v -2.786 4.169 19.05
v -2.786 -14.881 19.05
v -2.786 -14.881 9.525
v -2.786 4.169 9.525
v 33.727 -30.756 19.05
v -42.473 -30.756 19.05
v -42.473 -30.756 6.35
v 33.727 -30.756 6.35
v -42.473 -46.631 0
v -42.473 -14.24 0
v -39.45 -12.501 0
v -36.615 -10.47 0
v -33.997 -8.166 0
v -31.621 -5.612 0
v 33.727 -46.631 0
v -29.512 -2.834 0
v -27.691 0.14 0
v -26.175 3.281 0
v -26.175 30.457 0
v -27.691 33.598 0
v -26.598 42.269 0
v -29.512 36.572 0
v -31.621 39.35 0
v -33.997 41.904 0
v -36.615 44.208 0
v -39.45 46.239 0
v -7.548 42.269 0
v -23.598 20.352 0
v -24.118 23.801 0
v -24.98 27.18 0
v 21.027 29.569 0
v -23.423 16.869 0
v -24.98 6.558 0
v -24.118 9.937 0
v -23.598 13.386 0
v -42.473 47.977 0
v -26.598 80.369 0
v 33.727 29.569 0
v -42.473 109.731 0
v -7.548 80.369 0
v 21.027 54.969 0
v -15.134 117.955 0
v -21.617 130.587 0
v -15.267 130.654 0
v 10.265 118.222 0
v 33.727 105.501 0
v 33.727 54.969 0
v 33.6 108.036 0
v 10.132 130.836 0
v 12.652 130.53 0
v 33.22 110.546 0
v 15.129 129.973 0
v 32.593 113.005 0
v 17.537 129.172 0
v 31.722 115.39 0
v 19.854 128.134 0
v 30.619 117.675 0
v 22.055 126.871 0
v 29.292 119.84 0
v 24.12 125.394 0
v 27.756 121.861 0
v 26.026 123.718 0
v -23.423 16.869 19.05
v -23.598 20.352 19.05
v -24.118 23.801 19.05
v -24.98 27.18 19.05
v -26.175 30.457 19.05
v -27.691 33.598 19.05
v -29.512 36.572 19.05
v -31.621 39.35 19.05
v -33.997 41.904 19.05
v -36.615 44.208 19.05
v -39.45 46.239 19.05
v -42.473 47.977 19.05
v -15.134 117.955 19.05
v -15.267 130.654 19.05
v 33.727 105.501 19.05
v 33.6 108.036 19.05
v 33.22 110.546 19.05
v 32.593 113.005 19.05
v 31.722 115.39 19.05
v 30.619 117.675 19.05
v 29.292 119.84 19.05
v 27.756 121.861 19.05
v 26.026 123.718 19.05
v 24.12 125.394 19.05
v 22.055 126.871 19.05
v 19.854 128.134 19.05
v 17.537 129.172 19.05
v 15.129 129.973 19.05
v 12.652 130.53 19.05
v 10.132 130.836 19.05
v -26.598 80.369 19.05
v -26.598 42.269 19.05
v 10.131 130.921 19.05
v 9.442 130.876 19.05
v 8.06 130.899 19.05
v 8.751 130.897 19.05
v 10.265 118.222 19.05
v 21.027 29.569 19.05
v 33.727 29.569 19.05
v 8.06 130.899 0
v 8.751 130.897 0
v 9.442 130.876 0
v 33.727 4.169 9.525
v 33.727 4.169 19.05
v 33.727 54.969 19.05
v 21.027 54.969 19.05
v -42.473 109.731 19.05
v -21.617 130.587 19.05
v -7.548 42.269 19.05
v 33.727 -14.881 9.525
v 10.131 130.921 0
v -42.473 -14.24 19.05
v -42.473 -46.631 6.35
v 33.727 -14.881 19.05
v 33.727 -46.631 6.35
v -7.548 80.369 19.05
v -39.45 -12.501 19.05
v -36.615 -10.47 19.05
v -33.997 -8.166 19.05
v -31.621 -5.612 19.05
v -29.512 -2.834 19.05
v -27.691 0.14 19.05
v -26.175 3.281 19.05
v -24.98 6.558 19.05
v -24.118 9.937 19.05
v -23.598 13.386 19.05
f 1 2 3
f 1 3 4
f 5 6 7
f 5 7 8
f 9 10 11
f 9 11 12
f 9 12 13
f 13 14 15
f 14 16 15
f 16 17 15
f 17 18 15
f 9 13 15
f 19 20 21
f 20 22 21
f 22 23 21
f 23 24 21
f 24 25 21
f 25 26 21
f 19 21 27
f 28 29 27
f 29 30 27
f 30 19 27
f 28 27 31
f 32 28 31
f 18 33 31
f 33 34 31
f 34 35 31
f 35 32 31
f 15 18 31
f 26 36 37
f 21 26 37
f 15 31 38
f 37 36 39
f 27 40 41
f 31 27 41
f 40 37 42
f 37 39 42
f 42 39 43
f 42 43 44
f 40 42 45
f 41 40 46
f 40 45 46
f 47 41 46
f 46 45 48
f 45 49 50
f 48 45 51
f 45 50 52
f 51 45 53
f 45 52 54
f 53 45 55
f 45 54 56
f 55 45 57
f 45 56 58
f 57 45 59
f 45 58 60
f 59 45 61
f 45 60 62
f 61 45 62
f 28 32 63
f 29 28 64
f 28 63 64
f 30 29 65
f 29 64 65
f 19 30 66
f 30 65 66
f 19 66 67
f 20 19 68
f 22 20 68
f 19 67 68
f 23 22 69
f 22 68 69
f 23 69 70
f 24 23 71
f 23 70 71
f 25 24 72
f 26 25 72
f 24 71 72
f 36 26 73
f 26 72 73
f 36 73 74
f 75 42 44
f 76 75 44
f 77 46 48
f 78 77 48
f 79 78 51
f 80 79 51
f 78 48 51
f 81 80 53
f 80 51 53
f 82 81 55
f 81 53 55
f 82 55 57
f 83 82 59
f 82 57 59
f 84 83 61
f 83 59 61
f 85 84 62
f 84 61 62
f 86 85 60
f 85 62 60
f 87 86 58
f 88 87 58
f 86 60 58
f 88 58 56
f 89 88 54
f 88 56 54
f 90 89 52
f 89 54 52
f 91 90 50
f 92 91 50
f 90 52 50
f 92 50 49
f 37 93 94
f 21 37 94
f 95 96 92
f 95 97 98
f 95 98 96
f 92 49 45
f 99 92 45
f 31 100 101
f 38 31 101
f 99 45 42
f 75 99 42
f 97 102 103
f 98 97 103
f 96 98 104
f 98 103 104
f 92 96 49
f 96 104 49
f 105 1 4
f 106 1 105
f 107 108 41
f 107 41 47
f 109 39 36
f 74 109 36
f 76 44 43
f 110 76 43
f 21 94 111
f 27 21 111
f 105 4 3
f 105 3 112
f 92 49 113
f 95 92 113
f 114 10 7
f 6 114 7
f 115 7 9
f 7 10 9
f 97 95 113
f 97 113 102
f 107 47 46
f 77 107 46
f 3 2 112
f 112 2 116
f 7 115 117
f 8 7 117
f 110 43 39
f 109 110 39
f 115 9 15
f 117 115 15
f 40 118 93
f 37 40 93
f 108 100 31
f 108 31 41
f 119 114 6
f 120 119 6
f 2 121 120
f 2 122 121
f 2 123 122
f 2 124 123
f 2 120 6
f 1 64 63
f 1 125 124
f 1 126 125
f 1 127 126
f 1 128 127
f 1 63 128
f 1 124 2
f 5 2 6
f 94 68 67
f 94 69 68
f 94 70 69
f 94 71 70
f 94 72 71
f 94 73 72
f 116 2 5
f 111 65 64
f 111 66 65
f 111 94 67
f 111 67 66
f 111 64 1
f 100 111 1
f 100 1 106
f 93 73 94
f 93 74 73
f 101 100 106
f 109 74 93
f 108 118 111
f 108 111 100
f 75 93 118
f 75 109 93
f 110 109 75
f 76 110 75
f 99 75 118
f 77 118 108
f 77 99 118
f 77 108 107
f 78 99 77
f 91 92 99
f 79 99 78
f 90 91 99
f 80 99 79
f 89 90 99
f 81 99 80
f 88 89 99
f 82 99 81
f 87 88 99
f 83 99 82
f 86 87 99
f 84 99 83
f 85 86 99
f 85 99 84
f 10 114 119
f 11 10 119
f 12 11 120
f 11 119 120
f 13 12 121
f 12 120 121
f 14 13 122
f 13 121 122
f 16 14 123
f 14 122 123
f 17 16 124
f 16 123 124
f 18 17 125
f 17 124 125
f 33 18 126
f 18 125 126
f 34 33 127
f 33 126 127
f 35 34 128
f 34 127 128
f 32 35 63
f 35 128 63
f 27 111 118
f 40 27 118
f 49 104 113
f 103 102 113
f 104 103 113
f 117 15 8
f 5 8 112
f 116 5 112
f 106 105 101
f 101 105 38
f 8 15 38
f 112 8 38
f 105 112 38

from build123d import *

# Parameters (mm, degrees)
F1_DEPTH = 19.05
F2_W     = 76.2
F2_H     = 12.7
F3_DEPTH = 15.875
F5_DEPTH = 25.4
F6_W     = 36.5125
F6_H     = 19.05
F7_DEPTH = 9.525
F8_W     = 12.7
F8_H     = 25.4
F9_DEPTH = 25.4


with BuildPart() as f1:
    # F0 (on Top) → F1 (new body)
    with BuildSketch(Plane.XY):
        with BuildLine():
            Line((-21.616828, 130.587465), (-42.473463, 109.73083))
            Line((-42.473463, 109.73083), (-42.473463, -46.631057))
            Line((-42.473463, -46.631057), (33.726537, -46.631057))
            Line((33.726537, -46.631057), (33.726537, 105.50067))
            ThreePointArc((33.726537, 105.50067), (26.914525, 122.810976), (10.132309, 130.836399))
            Line((10.132309, 130.836399), (10.264848, 118.221736))
            Line((10.264848, 118.221736), (-15.13375, 117.95488))
            Line((-15.13375, 117.95488), (-15.267178, 130.654179))
            Line((-15.267178, 130.654179), (-21.616828, 130.587465))
        make_face()
        with BuildLine():
            ThreePointArc((8.059681, 130.899268), (9.096637, 130.888993), (10.132309, 130.836399))
            Line((10.132309, 130.836399), (10.13142, 130.921035))
            Line((10.13142, 130.921035), (8.059681, 130.899268))
        make_face()
    extrude(amount=F1_DEPTH)

    # F2 (on face) → F3 (cut)
    with BuildSketch(Plane.XZ.offset(46.631057)):
        with Locations((-4.373463, 12.7)):
            Rectangle(F2_W, F2_H)
    extrude(amount=-F3_DEPTH, mode=Mode.SUBTRACT)

    # F4 (on face) → F5 (cut)
    with BuildSketch(Plane.XY.offset(19.05)):
        with BuildLine():
            Line((-42.473463, 16.868943), (-42.473463, -14.239577))
            ThreePointArc((-42.473463, -14.239577), (-28.564323, -1.370044), (-23.423463, 16.868943))
            Line((-23.423463, 16.868943), (-42.473463, 16.868943))
        make_face()
        with BuildLine():
            Line((-42.473463, 47.977463), (-42.473463, 16.868943))
            Line((-42.473463, 16.868943), (-23.423463, 16.868943))
            ThreePointArc((-23.423463, 16.868943), (-28.564323, 35.107929), (-42.473463, 47.977463))
        make_face()
    extrude(amount=-F5_DEPTH, mode=Mode.SUBTRACT)

    # F6 (on face) → F7 (cut)
    with BuildSketch(Plane.XY.offset(19.05)):
        with Locations((15.470287, -5.356057)):
            Rectangle(F6_W, F6_H)
    extrude(amount=-F7_DEPTH, mode=Mode.SUBTRACT)

    # F8 (on face) → F9 (cut)
    with BuildSketch(Plane.XY.offset(19.05)):
        Polygon((-26.598463, 50.911564), (-26.598463, 42.268943), (-7.548463, 42.268943), (-7.548463, 80.368943), (-26.598463, 80.368943), align=None)
        with Locations((27.376537, 42.268943)):
            Rectangle(F8_W, F8_H)
    extrude(amount=-F9_DEPTH, mode=Mode.SUBTRACT)


solid = f1.part
